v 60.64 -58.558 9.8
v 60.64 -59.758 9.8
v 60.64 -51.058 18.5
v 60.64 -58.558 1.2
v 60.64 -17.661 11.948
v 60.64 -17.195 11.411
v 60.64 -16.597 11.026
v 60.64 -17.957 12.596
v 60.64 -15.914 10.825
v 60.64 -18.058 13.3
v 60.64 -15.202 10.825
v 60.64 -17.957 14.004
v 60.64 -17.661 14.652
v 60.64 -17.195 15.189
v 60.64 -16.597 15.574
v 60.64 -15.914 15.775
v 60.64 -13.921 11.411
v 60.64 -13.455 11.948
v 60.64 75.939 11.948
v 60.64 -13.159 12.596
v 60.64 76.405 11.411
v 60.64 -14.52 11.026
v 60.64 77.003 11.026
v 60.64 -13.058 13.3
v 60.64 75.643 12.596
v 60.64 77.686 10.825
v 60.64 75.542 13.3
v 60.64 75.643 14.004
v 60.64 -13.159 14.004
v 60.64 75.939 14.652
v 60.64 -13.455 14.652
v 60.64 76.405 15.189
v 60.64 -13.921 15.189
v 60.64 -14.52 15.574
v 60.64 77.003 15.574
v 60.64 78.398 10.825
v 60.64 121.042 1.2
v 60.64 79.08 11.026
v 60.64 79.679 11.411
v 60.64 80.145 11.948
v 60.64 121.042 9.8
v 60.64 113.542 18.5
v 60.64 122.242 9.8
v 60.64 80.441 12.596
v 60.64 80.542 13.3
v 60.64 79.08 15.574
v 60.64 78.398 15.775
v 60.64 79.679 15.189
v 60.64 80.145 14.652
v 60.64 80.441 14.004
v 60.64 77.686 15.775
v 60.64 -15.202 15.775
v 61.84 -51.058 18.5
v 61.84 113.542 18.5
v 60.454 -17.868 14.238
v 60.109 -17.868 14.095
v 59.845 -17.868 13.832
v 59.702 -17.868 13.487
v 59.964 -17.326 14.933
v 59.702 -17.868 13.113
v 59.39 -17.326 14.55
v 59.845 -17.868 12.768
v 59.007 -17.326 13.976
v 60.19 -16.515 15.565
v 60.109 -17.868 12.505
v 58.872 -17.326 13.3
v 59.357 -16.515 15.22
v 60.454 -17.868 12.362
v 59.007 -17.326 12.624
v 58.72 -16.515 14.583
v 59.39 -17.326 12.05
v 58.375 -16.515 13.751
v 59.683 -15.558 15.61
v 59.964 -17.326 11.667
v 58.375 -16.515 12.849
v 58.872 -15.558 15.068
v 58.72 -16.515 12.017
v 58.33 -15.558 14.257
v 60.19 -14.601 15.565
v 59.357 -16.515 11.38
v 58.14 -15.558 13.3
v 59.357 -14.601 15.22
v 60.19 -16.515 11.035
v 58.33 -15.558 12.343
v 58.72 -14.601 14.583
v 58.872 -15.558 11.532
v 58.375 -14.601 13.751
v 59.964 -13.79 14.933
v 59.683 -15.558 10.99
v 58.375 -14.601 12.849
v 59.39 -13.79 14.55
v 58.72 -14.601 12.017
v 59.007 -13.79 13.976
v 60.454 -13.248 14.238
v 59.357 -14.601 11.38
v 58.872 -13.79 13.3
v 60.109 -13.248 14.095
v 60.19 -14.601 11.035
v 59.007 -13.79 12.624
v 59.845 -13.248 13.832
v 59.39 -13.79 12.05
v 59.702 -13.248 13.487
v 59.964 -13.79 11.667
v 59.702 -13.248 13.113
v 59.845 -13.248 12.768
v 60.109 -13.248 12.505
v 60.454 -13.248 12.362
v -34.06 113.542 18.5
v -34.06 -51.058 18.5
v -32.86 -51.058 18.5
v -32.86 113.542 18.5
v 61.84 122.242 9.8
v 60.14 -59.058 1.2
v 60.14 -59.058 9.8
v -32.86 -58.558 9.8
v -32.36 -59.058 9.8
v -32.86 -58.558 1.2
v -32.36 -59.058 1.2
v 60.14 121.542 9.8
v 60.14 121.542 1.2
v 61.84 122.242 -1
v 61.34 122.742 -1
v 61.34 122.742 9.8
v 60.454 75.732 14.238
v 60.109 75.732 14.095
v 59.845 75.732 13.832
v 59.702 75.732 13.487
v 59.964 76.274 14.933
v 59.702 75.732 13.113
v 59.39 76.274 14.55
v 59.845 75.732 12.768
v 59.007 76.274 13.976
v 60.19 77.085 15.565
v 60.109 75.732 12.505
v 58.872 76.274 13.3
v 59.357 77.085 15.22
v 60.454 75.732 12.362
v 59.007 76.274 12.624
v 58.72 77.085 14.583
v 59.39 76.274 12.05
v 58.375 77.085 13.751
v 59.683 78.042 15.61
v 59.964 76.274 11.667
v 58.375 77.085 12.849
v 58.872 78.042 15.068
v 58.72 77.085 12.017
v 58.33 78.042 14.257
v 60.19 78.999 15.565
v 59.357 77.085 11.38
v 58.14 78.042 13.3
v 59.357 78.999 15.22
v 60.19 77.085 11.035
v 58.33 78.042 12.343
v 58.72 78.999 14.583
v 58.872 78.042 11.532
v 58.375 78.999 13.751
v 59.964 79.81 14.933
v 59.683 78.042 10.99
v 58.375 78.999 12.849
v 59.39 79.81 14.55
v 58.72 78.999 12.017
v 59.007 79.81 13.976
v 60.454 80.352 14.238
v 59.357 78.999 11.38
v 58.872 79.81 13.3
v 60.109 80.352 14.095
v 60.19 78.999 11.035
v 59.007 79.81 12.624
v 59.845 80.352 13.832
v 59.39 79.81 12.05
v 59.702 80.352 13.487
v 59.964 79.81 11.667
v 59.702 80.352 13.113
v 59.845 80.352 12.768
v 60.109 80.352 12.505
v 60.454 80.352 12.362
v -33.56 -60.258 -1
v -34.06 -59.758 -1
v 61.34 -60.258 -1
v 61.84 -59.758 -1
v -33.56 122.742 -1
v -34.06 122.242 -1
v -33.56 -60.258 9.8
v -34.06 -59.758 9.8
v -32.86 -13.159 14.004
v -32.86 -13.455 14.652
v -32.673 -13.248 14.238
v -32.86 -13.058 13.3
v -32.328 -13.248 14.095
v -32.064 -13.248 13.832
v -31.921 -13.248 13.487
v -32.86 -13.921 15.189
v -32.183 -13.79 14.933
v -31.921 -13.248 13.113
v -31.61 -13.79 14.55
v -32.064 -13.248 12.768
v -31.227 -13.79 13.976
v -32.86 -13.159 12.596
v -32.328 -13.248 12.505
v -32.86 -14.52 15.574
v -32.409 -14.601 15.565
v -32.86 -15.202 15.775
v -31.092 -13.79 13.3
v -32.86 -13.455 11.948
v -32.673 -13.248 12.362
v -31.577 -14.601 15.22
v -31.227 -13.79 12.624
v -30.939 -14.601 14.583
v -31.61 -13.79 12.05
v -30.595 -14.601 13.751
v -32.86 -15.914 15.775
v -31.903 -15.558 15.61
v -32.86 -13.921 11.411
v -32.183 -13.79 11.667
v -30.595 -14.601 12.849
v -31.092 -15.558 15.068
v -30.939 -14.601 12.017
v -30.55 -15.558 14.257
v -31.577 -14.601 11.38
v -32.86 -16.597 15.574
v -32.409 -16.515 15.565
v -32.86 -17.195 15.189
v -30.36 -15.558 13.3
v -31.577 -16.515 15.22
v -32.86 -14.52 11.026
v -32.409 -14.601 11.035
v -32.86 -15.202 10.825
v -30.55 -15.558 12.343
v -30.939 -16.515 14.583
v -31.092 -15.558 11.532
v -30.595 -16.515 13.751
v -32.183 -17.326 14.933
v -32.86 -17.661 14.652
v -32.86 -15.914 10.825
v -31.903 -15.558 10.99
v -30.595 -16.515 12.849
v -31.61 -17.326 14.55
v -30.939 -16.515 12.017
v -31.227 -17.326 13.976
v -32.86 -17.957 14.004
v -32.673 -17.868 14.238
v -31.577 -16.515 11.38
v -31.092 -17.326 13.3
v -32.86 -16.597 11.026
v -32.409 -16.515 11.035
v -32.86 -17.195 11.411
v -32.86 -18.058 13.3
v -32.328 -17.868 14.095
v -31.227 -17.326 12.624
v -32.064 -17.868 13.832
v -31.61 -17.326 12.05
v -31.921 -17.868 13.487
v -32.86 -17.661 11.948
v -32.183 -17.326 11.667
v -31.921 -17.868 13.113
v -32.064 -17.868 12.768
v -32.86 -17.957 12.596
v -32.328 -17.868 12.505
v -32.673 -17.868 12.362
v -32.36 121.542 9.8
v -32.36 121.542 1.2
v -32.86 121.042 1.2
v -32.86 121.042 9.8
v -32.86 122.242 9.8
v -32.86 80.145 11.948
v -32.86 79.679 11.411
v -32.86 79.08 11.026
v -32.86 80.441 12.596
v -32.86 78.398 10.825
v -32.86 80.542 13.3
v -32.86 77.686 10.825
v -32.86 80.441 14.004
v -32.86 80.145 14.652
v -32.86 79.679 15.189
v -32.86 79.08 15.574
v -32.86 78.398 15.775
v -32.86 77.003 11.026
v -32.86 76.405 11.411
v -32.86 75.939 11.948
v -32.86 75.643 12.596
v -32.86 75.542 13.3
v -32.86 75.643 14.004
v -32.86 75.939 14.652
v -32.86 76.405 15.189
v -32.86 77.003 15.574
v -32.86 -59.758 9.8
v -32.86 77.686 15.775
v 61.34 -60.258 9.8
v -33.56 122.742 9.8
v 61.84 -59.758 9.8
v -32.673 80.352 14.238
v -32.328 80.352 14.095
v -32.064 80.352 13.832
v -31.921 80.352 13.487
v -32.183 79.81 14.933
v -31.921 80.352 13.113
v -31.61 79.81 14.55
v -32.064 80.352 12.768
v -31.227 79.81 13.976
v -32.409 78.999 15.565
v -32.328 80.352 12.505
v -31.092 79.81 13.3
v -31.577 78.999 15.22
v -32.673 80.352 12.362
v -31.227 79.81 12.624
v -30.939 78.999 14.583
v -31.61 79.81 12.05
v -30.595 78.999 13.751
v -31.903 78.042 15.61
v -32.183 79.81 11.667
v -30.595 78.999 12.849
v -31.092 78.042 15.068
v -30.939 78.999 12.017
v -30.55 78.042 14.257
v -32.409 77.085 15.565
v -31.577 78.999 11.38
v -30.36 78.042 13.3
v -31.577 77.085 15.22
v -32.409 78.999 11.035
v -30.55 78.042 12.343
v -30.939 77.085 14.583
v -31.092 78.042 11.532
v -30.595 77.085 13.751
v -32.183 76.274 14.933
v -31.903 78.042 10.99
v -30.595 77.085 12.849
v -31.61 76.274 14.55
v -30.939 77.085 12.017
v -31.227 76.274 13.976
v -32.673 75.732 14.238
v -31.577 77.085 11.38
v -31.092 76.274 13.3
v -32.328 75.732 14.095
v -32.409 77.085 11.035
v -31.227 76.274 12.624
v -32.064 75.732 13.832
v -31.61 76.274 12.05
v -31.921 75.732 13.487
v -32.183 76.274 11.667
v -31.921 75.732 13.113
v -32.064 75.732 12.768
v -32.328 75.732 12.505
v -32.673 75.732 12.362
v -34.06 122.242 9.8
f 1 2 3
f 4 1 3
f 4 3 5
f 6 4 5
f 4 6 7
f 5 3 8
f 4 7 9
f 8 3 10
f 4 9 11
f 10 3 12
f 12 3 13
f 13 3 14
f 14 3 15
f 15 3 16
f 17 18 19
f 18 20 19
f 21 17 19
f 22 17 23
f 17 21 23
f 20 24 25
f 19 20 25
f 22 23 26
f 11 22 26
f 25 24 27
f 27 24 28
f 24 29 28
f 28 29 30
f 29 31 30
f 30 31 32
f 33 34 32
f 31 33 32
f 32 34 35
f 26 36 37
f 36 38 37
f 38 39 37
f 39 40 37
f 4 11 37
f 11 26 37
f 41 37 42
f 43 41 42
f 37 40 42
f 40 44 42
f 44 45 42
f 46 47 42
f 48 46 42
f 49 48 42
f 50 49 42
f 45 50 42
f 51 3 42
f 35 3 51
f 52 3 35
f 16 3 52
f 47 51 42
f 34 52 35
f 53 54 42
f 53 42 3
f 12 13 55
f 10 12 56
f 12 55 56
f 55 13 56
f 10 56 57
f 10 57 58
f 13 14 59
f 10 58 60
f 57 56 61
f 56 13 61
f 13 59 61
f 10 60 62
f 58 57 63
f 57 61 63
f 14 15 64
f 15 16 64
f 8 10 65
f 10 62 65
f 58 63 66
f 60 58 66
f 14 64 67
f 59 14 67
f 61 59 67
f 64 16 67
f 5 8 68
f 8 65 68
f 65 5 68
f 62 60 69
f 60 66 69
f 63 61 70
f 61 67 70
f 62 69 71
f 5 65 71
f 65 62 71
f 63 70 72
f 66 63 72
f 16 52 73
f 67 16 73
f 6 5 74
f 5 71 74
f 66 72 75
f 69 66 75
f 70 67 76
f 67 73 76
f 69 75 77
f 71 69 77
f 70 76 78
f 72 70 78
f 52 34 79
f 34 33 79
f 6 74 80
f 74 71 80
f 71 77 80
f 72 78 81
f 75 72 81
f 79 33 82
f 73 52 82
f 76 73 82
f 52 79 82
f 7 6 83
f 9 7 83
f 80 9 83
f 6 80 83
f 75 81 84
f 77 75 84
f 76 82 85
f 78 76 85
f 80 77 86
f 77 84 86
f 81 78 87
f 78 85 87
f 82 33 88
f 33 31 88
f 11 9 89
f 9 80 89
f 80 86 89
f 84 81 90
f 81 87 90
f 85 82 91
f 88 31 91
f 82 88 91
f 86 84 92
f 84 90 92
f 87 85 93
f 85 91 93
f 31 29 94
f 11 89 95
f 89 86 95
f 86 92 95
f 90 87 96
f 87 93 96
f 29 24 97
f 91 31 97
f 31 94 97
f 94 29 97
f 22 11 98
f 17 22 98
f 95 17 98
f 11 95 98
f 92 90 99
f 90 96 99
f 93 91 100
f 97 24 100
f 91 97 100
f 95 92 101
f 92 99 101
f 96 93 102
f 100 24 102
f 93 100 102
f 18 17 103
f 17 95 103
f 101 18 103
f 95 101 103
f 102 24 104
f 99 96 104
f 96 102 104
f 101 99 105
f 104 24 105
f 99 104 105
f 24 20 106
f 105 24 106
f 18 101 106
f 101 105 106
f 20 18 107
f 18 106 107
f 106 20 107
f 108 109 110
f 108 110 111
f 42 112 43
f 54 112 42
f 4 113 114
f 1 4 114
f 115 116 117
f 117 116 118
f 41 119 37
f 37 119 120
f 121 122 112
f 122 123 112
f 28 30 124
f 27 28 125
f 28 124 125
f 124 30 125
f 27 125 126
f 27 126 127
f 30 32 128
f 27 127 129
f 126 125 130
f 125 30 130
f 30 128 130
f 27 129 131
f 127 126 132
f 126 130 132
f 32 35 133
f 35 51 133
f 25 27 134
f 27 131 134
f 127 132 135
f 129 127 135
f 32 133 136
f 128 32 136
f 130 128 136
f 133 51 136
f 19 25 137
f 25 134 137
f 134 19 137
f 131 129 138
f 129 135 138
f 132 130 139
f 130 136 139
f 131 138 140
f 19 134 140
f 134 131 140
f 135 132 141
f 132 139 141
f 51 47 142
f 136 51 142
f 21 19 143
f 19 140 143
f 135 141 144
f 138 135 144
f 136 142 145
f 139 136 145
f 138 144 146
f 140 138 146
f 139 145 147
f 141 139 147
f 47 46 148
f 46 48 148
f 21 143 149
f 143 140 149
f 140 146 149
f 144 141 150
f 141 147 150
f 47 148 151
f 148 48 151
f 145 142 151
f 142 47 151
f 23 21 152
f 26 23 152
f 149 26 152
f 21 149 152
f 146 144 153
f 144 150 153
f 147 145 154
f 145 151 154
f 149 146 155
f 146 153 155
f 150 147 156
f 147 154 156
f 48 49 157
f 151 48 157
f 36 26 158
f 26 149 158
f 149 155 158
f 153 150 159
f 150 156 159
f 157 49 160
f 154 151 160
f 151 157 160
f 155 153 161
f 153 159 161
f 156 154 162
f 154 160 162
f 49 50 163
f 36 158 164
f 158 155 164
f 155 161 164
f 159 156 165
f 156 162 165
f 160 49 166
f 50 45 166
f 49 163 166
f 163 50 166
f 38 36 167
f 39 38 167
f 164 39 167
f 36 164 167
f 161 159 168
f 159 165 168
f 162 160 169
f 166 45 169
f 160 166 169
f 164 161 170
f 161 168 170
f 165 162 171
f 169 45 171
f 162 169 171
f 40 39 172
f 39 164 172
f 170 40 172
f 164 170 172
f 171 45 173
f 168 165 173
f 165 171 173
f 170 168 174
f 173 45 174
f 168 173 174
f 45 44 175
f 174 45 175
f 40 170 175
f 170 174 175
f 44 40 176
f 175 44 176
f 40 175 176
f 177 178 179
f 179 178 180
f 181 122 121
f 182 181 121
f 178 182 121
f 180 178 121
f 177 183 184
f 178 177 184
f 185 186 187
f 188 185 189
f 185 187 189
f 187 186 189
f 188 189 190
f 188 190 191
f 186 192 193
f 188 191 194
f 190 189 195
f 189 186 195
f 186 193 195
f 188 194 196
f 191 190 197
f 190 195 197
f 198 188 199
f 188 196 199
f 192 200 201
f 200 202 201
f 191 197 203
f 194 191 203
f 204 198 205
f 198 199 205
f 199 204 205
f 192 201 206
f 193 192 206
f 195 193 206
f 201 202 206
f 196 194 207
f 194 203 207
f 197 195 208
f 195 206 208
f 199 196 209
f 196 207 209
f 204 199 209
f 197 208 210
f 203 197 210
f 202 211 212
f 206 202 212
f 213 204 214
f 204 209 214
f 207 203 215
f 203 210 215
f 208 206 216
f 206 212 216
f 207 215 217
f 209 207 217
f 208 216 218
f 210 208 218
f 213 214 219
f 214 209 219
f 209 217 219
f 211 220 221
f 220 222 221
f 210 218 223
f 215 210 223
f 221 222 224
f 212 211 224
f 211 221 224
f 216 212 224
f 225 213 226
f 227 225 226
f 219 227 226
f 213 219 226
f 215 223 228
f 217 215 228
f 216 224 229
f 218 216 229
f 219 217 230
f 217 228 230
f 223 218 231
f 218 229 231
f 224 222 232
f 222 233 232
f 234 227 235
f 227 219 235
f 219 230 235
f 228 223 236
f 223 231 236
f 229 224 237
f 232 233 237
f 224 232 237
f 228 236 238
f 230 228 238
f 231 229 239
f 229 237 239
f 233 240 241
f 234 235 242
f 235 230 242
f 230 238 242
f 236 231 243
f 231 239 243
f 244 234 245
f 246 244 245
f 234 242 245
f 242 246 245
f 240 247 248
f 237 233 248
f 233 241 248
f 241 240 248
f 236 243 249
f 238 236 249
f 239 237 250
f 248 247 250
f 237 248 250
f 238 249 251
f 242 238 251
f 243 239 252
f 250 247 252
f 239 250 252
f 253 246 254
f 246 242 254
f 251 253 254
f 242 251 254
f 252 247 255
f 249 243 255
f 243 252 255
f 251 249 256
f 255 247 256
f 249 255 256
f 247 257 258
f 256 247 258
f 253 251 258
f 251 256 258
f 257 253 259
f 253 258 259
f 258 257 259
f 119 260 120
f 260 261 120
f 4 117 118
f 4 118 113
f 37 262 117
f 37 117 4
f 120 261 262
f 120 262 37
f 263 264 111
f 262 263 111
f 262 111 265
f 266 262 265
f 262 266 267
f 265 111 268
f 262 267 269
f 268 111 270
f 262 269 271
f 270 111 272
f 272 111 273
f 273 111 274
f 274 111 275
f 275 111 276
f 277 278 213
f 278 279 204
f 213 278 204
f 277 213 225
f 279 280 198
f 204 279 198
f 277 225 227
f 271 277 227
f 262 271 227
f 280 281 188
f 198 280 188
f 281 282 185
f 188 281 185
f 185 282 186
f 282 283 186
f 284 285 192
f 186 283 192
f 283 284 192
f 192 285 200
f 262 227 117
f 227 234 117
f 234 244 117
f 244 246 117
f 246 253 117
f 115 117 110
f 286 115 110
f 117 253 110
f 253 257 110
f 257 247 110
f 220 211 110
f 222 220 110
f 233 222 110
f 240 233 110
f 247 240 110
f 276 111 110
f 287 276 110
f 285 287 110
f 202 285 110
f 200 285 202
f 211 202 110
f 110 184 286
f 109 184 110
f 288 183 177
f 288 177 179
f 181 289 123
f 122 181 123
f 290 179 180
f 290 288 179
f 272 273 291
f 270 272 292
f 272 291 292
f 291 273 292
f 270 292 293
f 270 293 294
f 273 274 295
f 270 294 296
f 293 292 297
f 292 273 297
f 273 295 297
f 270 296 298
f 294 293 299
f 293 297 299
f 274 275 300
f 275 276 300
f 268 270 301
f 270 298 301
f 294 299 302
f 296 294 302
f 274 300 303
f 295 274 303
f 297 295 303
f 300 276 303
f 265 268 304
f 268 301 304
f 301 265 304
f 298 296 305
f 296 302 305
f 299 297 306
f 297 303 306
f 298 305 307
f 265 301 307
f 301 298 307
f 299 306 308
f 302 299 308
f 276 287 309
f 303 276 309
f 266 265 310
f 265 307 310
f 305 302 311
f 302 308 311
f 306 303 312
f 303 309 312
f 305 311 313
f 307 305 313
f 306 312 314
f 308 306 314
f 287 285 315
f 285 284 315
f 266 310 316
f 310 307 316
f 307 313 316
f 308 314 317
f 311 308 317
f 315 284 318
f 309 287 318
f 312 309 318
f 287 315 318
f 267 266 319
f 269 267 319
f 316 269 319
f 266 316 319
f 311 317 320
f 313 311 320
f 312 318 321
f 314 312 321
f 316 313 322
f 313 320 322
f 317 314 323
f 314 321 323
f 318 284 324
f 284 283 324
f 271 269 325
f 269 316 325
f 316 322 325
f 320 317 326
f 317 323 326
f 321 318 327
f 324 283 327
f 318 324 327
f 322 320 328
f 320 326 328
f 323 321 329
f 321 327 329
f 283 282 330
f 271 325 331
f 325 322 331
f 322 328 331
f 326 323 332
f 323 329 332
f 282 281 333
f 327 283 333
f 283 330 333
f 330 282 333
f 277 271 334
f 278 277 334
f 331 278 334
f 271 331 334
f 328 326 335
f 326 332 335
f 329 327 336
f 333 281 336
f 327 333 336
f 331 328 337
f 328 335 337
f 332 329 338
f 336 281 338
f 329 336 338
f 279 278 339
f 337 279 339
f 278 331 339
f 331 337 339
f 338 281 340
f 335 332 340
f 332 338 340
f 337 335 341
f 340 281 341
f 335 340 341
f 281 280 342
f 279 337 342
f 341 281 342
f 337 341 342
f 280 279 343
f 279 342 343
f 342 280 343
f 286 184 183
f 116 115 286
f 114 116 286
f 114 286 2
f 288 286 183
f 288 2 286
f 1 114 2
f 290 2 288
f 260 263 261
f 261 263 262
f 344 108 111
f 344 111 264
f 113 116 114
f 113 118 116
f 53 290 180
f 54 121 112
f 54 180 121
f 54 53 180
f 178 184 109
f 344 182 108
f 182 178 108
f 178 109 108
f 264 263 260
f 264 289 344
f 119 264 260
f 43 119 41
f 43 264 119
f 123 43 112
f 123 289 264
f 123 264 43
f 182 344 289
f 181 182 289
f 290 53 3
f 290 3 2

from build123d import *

# Parameters (mm, degrees)
F0_W      = 95.9
F0_H      = 183
F1_DEPTH  = 9.8
F2_T      = -1.2
F3_SIZE   = 0.5
F4_SIZE   = 0.5
F5_SIZE   = 0.5
F6_SIZE   = 0.5
F7_SIZE   = 0.5
F8_SIZE   = 0.5
F9_SIZE   = 0.5
F11_DEPTH = 1.2
F13_DEPTH = 1.2
F15_ANGLE = 180
F16_ANGLE = 180
F18_ANGLE = 180
F19_ANGLE = 180
F20_DEPTH = 1


with BuildPart() as f1:
    # F0 (on Top) → F1 (new body)
    with BuildSketch(Plane.XY):
        with Locations((13.8901774406, 31.2419057786)):
            Rectangle(F0_W, F0_H)
    extrude(amount=F1_DEPTH)

    # F2
    f2_openings = [f1.faces().sort_by_distance(p)[0] for p in [
        (13.890177, 31.241906, 9.8),
    ]]
    offset(amount=F2_T, openings=f2_openings)

    # F3
    f3_edges = [f1.edges().sort_by_distance(p)[0] for p in [
        (61.840177, -60.258094, 4.9),
    ]]
    chamfer(f3_edges, length=F3_SIZE)

    # F4
    f4_edges = [f1.edges().sort_by_distance(p)[0] for p in [
        (-34.059823, -60.258094, 4.9),
    ]]
    chamfer(f4_edges, length=F4_SIZE)

    # F5
    f5_edges = [f1.edges().sort_by_distance(p)[0] for p in [
        (-34.059823, 122.741906, 4.9),
    ]]
    chamfer(f5_edges, length=F5_SIZE)

    # F6
    f6_edges = [f1.edges().sort_by_distance(p)[0] for p in [
        (61.840177, 122.741906, 4.9),
    ]]
    chamfer(f6_edges, length=F6_SIZE)

    # F7
    f7_edges = [f1.edges().sort_by_distance(p)[0] for p in [
        (60.640177, 121.541906, 5.5),
    ]]
    chamfer(f7_edges, length=F7_SIZE)

    # F8
    f8_edges = [f1.edges().sort_by_distance(p)[0] for p in [
        (-32.859823, 121.541906, 5.5),
    ]]
    chamfer(f8_edges, length=F8_SIZE)

    # F9
    f9_edges = [f1.edges().sort_by_distance(p)[0] for p in [
        (60.640177, -59.058094, 5.5),
        (-32.859823, -59.058094, 5.5),
    ]]
    chamfer(f9_edges, length=F9_SIZE)

    # F10 (on face) → F11 (join, through all)
    with BuildSketch(Plane.YZ.offset(61.8401774406)):
        Polygon((-51.0580942214, 18.5), (-59.7580942214, 9.8), (122.2419057786, 9.8), (113.5419057786, 18.5), align=None)
    extrude(amount=-F11_DEPTH)

    # F12 (on face) → F13 (join, through all)
    with BuildSketch(Plane(origin=(-34.0598225594, 0, 0), x_dir=(0, -1, 0), z_dir=(-1, 0, 0))):
        Polygon((51.0580942214, 18.5), (-113.5419057786, 18.5), (-122.2419057786, 9.8), (59.7580942214, 9.8), align=None)
    extrude(amount=-F13_DEPTH)

    # F14 (on face) → F15 (revolve)
    with BuildSketch(Plane.YZ.offset(-32.8598225594)):
        with BuildLine():
            Line((-15.5580942214, 13.3), (-13.0580942214, 13.3))
            ThreePointArc((-13.0580942214, 13.3), (-15.5580942214, 15.8), (-18.0580942214, 13.3))
            Line((-18.0580942214, 13.3), (-15.5580942214, 13.3))
        make_face()
    revolve(axis=Axis((-32.8598225594, -14.3080942214, 13.3), (0, 1, 0)), revolution_arc=F15_ANGLE)

    # F14 (on face) → F16 (revolve)
    with BuildSketch(Plane.YZ.offset(-32.8598225594)):
        with BuildLine():
            Line((78.0419057786, 13.3), (80.5419057786, 13.3))
            ThreePointArc((80.5419057786, 13.3), (78.0419057786, 15.8), (75.5419057786, 13.3))
            Line((75.5419057786, 13.3), (78.0419057786, 13.3))
        make_face()
    revolve(axis=Axis((-32.8598225594, 79.2919057786, 13.3), (0, 1, 0)), revolution_arc=F16_ANGLE)

    # F17 (on face) → F18 (revolve)
    with BuildSketch(Plane(origin=(60.6401774406, 0, 0), x_dir=(0, -1, 0), z_dir=(-1, 0, 0))):
        with BuildLine():
            Line((-78.0419057786, 13.3), (-75.5419057786, 13.3))
            ThreePointArc((-75.5419057786, 13.3), (-78.0419057786, 15.8), (-80.5419057786, 13.3))
            Line((-80.5419057786, 13.3), (-78.0419057786, 13.3))
        make_face()
    revolve(axis=Axis((60.6401774406, 76.7919057786, 13.3), (0, -1, 0)), revolution_arc=F18_ANGLE)

    # F17 (on face) → F19 (revolve)
    with BuildSketch(Plane(origin=(60.6401774406, 0, 0), x_dir=(0, -1, 0), z_dir=(-1, 0, 0))):
        with BuildLine():
            Line((15.5580942214, 13.3), (18.0580942214, 13.3))
            ThreePointArc((18.0580942214, 13.3), (15.5580942214, 15.8), (13.0580942214, 13.3))
            Line((13.0580942214, 13.3), (15.5580942214, 13.3))
        make_face()
    revolve(axis=Axis((60.6401774406, -16.8080942214, 13.3), (0, -1, 0)), revolution_arc=F19_ANGLE)

    # F20 (add): a face of the model
    f20_faces = [f1.faces().sort_by_distance(p)[0] for p in [
        (13.8901774406, 31.2419057786, 0),
    ]]
    extrude(f20_faces, amount=F20_DEPTH)


solid = f1.part
